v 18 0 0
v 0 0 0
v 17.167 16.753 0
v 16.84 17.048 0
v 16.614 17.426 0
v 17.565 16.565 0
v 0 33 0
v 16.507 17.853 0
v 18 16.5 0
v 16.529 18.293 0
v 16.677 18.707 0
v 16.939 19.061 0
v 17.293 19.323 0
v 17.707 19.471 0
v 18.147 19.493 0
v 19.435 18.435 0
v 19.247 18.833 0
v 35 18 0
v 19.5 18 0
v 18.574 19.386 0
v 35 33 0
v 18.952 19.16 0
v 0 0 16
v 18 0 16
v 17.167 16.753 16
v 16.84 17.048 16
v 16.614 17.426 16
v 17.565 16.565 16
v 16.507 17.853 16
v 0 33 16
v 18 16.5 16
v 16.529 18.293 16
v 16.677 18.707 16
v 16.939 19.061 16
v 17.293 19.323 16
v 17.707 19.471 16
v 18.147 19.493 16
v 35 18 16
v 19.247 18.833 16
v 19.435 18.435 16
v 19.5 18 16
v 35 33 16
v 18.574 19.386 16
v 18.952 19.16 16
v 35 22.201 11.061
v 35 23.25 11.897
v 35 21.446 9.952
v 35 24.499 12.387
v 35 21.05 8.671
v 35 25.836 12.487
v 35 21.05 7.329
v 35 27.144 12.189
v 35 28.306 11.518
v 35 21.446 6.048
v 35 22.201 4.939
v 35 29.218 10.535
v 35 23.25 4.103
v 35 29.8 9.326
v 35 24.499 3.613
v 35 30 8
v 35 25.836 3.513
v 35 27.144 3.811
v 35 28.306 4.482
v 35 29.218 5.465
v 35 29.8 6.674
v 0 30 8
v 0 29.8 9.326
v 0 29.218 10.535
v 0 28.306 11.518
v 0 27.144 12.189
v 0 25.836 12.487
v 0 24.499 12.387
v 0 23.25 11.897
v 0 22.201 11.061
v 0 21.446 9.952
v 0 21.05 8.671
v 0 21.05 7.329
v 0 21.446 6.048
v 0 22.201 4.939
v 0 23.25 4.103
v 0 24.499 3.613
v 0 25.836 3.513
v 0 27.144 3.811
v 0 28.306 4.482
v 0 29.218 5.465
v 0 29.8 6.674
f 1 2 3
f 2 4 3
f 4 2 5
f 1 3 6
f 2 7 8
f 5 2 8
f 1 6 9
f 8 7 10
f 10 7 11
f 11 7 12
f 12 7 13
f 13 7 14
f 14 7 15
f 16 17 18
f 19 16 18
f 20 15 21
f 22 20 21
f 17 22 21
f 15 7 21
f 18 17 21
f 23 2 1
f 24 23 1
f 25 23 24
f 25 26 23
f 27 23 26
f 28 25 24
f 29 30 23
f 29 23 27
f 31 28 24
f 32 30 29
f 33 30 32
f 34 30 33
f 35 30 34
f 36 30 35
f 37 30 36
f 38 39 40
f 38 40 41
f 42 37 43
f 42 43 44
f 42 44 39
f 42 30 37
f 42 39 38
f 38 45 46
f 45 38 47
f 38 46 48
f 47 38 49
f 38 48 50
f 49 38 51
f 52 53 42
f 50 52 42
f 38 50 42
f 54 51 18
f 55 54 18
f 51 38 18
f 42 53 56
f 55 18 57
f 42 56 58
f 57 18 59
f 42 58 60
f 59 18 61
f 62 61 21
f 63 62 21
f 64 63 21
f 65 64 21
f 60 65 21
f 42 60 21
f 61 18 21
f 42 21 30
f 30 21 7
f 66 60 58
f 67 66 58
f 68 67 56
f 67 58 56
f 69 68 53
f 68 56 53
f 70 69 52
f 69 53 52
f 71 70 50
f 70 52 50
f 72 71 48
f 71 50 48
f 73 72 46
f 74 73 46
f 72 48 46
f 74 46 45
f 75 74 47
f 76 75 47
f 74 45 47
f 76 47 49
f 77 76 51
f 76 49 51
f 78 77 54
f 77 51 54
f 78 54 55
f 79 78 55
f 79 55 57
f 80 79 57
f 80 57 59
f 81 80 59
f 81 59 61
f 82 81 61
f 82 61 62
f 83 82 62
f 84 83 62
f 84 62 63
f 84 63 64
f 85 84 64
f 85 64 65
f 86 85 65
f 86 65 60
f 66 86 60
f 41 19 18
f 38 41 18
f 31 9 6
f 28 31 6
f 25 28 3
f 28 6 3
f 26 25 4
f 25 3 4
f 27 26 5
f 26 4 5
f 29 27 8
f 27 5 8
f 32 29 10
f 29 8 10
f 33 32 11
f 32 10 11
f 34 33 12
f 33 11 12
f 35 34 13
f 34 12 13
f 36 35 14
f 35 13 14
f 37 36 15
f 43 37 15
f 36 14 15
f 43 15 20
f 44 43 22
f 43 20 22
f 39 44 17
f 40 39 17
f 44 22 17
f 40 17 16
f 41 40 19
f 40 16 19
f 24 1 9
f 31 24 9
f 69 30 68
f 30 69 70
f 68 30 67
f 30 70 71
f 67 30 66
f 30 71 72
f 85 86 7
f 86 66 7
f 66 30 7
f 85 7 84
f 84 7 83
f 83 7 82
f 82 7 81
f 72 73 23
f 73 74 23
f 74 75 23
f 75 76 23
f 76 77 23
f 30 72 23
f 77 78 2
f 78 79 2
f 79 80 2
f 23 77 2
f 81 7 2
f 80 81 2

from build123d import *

# Parameters (mm, degrees)
RESSALTO_EXTRUS_O1_DEPTH = 16
ESBO_O5_R                = 4.5
CORTE_EXTRUS_O1_DEPTH    = 51.695167423


with BuildPart() as part:
    # Esboço2 → Ressalto-extrusão1 (new body)
    with BuildSketch(Plane.XY):
        with BuildLine():
            Line((0, 33), (0, 0))
            Line((0, 0), (18, 0))
            Line((18, 0), (18, 16.5))
            ThreePointArc((18, 16.5), (16.939339828, 19.060660172), (19.5, 18))
            Line((19.5, 18), (35, 18))
            Line((35, 18), (35, 33))
            Line((35, 33), (0, 33))
        make_face()
    extrude(amount=RESSALTO_EXTRUS_O1_DEPTH)

    # Esboço5 → Corte-extrusão1 (cut, through all)
    with BuildSketch(Plane(origin=(35, 0, 0), x_dir=(0, 0, -1), z_dir=(1, 0, 0))):
        with Locations(Location((-8, 25.5, 0), (0, 0, 90))):
            Circle(ESBO_O5_R)
    extrude(amount=-CORTE_EXTRUS_O1_DEPTH, mode=Mode.SUBTRACT)


solid = part.part
